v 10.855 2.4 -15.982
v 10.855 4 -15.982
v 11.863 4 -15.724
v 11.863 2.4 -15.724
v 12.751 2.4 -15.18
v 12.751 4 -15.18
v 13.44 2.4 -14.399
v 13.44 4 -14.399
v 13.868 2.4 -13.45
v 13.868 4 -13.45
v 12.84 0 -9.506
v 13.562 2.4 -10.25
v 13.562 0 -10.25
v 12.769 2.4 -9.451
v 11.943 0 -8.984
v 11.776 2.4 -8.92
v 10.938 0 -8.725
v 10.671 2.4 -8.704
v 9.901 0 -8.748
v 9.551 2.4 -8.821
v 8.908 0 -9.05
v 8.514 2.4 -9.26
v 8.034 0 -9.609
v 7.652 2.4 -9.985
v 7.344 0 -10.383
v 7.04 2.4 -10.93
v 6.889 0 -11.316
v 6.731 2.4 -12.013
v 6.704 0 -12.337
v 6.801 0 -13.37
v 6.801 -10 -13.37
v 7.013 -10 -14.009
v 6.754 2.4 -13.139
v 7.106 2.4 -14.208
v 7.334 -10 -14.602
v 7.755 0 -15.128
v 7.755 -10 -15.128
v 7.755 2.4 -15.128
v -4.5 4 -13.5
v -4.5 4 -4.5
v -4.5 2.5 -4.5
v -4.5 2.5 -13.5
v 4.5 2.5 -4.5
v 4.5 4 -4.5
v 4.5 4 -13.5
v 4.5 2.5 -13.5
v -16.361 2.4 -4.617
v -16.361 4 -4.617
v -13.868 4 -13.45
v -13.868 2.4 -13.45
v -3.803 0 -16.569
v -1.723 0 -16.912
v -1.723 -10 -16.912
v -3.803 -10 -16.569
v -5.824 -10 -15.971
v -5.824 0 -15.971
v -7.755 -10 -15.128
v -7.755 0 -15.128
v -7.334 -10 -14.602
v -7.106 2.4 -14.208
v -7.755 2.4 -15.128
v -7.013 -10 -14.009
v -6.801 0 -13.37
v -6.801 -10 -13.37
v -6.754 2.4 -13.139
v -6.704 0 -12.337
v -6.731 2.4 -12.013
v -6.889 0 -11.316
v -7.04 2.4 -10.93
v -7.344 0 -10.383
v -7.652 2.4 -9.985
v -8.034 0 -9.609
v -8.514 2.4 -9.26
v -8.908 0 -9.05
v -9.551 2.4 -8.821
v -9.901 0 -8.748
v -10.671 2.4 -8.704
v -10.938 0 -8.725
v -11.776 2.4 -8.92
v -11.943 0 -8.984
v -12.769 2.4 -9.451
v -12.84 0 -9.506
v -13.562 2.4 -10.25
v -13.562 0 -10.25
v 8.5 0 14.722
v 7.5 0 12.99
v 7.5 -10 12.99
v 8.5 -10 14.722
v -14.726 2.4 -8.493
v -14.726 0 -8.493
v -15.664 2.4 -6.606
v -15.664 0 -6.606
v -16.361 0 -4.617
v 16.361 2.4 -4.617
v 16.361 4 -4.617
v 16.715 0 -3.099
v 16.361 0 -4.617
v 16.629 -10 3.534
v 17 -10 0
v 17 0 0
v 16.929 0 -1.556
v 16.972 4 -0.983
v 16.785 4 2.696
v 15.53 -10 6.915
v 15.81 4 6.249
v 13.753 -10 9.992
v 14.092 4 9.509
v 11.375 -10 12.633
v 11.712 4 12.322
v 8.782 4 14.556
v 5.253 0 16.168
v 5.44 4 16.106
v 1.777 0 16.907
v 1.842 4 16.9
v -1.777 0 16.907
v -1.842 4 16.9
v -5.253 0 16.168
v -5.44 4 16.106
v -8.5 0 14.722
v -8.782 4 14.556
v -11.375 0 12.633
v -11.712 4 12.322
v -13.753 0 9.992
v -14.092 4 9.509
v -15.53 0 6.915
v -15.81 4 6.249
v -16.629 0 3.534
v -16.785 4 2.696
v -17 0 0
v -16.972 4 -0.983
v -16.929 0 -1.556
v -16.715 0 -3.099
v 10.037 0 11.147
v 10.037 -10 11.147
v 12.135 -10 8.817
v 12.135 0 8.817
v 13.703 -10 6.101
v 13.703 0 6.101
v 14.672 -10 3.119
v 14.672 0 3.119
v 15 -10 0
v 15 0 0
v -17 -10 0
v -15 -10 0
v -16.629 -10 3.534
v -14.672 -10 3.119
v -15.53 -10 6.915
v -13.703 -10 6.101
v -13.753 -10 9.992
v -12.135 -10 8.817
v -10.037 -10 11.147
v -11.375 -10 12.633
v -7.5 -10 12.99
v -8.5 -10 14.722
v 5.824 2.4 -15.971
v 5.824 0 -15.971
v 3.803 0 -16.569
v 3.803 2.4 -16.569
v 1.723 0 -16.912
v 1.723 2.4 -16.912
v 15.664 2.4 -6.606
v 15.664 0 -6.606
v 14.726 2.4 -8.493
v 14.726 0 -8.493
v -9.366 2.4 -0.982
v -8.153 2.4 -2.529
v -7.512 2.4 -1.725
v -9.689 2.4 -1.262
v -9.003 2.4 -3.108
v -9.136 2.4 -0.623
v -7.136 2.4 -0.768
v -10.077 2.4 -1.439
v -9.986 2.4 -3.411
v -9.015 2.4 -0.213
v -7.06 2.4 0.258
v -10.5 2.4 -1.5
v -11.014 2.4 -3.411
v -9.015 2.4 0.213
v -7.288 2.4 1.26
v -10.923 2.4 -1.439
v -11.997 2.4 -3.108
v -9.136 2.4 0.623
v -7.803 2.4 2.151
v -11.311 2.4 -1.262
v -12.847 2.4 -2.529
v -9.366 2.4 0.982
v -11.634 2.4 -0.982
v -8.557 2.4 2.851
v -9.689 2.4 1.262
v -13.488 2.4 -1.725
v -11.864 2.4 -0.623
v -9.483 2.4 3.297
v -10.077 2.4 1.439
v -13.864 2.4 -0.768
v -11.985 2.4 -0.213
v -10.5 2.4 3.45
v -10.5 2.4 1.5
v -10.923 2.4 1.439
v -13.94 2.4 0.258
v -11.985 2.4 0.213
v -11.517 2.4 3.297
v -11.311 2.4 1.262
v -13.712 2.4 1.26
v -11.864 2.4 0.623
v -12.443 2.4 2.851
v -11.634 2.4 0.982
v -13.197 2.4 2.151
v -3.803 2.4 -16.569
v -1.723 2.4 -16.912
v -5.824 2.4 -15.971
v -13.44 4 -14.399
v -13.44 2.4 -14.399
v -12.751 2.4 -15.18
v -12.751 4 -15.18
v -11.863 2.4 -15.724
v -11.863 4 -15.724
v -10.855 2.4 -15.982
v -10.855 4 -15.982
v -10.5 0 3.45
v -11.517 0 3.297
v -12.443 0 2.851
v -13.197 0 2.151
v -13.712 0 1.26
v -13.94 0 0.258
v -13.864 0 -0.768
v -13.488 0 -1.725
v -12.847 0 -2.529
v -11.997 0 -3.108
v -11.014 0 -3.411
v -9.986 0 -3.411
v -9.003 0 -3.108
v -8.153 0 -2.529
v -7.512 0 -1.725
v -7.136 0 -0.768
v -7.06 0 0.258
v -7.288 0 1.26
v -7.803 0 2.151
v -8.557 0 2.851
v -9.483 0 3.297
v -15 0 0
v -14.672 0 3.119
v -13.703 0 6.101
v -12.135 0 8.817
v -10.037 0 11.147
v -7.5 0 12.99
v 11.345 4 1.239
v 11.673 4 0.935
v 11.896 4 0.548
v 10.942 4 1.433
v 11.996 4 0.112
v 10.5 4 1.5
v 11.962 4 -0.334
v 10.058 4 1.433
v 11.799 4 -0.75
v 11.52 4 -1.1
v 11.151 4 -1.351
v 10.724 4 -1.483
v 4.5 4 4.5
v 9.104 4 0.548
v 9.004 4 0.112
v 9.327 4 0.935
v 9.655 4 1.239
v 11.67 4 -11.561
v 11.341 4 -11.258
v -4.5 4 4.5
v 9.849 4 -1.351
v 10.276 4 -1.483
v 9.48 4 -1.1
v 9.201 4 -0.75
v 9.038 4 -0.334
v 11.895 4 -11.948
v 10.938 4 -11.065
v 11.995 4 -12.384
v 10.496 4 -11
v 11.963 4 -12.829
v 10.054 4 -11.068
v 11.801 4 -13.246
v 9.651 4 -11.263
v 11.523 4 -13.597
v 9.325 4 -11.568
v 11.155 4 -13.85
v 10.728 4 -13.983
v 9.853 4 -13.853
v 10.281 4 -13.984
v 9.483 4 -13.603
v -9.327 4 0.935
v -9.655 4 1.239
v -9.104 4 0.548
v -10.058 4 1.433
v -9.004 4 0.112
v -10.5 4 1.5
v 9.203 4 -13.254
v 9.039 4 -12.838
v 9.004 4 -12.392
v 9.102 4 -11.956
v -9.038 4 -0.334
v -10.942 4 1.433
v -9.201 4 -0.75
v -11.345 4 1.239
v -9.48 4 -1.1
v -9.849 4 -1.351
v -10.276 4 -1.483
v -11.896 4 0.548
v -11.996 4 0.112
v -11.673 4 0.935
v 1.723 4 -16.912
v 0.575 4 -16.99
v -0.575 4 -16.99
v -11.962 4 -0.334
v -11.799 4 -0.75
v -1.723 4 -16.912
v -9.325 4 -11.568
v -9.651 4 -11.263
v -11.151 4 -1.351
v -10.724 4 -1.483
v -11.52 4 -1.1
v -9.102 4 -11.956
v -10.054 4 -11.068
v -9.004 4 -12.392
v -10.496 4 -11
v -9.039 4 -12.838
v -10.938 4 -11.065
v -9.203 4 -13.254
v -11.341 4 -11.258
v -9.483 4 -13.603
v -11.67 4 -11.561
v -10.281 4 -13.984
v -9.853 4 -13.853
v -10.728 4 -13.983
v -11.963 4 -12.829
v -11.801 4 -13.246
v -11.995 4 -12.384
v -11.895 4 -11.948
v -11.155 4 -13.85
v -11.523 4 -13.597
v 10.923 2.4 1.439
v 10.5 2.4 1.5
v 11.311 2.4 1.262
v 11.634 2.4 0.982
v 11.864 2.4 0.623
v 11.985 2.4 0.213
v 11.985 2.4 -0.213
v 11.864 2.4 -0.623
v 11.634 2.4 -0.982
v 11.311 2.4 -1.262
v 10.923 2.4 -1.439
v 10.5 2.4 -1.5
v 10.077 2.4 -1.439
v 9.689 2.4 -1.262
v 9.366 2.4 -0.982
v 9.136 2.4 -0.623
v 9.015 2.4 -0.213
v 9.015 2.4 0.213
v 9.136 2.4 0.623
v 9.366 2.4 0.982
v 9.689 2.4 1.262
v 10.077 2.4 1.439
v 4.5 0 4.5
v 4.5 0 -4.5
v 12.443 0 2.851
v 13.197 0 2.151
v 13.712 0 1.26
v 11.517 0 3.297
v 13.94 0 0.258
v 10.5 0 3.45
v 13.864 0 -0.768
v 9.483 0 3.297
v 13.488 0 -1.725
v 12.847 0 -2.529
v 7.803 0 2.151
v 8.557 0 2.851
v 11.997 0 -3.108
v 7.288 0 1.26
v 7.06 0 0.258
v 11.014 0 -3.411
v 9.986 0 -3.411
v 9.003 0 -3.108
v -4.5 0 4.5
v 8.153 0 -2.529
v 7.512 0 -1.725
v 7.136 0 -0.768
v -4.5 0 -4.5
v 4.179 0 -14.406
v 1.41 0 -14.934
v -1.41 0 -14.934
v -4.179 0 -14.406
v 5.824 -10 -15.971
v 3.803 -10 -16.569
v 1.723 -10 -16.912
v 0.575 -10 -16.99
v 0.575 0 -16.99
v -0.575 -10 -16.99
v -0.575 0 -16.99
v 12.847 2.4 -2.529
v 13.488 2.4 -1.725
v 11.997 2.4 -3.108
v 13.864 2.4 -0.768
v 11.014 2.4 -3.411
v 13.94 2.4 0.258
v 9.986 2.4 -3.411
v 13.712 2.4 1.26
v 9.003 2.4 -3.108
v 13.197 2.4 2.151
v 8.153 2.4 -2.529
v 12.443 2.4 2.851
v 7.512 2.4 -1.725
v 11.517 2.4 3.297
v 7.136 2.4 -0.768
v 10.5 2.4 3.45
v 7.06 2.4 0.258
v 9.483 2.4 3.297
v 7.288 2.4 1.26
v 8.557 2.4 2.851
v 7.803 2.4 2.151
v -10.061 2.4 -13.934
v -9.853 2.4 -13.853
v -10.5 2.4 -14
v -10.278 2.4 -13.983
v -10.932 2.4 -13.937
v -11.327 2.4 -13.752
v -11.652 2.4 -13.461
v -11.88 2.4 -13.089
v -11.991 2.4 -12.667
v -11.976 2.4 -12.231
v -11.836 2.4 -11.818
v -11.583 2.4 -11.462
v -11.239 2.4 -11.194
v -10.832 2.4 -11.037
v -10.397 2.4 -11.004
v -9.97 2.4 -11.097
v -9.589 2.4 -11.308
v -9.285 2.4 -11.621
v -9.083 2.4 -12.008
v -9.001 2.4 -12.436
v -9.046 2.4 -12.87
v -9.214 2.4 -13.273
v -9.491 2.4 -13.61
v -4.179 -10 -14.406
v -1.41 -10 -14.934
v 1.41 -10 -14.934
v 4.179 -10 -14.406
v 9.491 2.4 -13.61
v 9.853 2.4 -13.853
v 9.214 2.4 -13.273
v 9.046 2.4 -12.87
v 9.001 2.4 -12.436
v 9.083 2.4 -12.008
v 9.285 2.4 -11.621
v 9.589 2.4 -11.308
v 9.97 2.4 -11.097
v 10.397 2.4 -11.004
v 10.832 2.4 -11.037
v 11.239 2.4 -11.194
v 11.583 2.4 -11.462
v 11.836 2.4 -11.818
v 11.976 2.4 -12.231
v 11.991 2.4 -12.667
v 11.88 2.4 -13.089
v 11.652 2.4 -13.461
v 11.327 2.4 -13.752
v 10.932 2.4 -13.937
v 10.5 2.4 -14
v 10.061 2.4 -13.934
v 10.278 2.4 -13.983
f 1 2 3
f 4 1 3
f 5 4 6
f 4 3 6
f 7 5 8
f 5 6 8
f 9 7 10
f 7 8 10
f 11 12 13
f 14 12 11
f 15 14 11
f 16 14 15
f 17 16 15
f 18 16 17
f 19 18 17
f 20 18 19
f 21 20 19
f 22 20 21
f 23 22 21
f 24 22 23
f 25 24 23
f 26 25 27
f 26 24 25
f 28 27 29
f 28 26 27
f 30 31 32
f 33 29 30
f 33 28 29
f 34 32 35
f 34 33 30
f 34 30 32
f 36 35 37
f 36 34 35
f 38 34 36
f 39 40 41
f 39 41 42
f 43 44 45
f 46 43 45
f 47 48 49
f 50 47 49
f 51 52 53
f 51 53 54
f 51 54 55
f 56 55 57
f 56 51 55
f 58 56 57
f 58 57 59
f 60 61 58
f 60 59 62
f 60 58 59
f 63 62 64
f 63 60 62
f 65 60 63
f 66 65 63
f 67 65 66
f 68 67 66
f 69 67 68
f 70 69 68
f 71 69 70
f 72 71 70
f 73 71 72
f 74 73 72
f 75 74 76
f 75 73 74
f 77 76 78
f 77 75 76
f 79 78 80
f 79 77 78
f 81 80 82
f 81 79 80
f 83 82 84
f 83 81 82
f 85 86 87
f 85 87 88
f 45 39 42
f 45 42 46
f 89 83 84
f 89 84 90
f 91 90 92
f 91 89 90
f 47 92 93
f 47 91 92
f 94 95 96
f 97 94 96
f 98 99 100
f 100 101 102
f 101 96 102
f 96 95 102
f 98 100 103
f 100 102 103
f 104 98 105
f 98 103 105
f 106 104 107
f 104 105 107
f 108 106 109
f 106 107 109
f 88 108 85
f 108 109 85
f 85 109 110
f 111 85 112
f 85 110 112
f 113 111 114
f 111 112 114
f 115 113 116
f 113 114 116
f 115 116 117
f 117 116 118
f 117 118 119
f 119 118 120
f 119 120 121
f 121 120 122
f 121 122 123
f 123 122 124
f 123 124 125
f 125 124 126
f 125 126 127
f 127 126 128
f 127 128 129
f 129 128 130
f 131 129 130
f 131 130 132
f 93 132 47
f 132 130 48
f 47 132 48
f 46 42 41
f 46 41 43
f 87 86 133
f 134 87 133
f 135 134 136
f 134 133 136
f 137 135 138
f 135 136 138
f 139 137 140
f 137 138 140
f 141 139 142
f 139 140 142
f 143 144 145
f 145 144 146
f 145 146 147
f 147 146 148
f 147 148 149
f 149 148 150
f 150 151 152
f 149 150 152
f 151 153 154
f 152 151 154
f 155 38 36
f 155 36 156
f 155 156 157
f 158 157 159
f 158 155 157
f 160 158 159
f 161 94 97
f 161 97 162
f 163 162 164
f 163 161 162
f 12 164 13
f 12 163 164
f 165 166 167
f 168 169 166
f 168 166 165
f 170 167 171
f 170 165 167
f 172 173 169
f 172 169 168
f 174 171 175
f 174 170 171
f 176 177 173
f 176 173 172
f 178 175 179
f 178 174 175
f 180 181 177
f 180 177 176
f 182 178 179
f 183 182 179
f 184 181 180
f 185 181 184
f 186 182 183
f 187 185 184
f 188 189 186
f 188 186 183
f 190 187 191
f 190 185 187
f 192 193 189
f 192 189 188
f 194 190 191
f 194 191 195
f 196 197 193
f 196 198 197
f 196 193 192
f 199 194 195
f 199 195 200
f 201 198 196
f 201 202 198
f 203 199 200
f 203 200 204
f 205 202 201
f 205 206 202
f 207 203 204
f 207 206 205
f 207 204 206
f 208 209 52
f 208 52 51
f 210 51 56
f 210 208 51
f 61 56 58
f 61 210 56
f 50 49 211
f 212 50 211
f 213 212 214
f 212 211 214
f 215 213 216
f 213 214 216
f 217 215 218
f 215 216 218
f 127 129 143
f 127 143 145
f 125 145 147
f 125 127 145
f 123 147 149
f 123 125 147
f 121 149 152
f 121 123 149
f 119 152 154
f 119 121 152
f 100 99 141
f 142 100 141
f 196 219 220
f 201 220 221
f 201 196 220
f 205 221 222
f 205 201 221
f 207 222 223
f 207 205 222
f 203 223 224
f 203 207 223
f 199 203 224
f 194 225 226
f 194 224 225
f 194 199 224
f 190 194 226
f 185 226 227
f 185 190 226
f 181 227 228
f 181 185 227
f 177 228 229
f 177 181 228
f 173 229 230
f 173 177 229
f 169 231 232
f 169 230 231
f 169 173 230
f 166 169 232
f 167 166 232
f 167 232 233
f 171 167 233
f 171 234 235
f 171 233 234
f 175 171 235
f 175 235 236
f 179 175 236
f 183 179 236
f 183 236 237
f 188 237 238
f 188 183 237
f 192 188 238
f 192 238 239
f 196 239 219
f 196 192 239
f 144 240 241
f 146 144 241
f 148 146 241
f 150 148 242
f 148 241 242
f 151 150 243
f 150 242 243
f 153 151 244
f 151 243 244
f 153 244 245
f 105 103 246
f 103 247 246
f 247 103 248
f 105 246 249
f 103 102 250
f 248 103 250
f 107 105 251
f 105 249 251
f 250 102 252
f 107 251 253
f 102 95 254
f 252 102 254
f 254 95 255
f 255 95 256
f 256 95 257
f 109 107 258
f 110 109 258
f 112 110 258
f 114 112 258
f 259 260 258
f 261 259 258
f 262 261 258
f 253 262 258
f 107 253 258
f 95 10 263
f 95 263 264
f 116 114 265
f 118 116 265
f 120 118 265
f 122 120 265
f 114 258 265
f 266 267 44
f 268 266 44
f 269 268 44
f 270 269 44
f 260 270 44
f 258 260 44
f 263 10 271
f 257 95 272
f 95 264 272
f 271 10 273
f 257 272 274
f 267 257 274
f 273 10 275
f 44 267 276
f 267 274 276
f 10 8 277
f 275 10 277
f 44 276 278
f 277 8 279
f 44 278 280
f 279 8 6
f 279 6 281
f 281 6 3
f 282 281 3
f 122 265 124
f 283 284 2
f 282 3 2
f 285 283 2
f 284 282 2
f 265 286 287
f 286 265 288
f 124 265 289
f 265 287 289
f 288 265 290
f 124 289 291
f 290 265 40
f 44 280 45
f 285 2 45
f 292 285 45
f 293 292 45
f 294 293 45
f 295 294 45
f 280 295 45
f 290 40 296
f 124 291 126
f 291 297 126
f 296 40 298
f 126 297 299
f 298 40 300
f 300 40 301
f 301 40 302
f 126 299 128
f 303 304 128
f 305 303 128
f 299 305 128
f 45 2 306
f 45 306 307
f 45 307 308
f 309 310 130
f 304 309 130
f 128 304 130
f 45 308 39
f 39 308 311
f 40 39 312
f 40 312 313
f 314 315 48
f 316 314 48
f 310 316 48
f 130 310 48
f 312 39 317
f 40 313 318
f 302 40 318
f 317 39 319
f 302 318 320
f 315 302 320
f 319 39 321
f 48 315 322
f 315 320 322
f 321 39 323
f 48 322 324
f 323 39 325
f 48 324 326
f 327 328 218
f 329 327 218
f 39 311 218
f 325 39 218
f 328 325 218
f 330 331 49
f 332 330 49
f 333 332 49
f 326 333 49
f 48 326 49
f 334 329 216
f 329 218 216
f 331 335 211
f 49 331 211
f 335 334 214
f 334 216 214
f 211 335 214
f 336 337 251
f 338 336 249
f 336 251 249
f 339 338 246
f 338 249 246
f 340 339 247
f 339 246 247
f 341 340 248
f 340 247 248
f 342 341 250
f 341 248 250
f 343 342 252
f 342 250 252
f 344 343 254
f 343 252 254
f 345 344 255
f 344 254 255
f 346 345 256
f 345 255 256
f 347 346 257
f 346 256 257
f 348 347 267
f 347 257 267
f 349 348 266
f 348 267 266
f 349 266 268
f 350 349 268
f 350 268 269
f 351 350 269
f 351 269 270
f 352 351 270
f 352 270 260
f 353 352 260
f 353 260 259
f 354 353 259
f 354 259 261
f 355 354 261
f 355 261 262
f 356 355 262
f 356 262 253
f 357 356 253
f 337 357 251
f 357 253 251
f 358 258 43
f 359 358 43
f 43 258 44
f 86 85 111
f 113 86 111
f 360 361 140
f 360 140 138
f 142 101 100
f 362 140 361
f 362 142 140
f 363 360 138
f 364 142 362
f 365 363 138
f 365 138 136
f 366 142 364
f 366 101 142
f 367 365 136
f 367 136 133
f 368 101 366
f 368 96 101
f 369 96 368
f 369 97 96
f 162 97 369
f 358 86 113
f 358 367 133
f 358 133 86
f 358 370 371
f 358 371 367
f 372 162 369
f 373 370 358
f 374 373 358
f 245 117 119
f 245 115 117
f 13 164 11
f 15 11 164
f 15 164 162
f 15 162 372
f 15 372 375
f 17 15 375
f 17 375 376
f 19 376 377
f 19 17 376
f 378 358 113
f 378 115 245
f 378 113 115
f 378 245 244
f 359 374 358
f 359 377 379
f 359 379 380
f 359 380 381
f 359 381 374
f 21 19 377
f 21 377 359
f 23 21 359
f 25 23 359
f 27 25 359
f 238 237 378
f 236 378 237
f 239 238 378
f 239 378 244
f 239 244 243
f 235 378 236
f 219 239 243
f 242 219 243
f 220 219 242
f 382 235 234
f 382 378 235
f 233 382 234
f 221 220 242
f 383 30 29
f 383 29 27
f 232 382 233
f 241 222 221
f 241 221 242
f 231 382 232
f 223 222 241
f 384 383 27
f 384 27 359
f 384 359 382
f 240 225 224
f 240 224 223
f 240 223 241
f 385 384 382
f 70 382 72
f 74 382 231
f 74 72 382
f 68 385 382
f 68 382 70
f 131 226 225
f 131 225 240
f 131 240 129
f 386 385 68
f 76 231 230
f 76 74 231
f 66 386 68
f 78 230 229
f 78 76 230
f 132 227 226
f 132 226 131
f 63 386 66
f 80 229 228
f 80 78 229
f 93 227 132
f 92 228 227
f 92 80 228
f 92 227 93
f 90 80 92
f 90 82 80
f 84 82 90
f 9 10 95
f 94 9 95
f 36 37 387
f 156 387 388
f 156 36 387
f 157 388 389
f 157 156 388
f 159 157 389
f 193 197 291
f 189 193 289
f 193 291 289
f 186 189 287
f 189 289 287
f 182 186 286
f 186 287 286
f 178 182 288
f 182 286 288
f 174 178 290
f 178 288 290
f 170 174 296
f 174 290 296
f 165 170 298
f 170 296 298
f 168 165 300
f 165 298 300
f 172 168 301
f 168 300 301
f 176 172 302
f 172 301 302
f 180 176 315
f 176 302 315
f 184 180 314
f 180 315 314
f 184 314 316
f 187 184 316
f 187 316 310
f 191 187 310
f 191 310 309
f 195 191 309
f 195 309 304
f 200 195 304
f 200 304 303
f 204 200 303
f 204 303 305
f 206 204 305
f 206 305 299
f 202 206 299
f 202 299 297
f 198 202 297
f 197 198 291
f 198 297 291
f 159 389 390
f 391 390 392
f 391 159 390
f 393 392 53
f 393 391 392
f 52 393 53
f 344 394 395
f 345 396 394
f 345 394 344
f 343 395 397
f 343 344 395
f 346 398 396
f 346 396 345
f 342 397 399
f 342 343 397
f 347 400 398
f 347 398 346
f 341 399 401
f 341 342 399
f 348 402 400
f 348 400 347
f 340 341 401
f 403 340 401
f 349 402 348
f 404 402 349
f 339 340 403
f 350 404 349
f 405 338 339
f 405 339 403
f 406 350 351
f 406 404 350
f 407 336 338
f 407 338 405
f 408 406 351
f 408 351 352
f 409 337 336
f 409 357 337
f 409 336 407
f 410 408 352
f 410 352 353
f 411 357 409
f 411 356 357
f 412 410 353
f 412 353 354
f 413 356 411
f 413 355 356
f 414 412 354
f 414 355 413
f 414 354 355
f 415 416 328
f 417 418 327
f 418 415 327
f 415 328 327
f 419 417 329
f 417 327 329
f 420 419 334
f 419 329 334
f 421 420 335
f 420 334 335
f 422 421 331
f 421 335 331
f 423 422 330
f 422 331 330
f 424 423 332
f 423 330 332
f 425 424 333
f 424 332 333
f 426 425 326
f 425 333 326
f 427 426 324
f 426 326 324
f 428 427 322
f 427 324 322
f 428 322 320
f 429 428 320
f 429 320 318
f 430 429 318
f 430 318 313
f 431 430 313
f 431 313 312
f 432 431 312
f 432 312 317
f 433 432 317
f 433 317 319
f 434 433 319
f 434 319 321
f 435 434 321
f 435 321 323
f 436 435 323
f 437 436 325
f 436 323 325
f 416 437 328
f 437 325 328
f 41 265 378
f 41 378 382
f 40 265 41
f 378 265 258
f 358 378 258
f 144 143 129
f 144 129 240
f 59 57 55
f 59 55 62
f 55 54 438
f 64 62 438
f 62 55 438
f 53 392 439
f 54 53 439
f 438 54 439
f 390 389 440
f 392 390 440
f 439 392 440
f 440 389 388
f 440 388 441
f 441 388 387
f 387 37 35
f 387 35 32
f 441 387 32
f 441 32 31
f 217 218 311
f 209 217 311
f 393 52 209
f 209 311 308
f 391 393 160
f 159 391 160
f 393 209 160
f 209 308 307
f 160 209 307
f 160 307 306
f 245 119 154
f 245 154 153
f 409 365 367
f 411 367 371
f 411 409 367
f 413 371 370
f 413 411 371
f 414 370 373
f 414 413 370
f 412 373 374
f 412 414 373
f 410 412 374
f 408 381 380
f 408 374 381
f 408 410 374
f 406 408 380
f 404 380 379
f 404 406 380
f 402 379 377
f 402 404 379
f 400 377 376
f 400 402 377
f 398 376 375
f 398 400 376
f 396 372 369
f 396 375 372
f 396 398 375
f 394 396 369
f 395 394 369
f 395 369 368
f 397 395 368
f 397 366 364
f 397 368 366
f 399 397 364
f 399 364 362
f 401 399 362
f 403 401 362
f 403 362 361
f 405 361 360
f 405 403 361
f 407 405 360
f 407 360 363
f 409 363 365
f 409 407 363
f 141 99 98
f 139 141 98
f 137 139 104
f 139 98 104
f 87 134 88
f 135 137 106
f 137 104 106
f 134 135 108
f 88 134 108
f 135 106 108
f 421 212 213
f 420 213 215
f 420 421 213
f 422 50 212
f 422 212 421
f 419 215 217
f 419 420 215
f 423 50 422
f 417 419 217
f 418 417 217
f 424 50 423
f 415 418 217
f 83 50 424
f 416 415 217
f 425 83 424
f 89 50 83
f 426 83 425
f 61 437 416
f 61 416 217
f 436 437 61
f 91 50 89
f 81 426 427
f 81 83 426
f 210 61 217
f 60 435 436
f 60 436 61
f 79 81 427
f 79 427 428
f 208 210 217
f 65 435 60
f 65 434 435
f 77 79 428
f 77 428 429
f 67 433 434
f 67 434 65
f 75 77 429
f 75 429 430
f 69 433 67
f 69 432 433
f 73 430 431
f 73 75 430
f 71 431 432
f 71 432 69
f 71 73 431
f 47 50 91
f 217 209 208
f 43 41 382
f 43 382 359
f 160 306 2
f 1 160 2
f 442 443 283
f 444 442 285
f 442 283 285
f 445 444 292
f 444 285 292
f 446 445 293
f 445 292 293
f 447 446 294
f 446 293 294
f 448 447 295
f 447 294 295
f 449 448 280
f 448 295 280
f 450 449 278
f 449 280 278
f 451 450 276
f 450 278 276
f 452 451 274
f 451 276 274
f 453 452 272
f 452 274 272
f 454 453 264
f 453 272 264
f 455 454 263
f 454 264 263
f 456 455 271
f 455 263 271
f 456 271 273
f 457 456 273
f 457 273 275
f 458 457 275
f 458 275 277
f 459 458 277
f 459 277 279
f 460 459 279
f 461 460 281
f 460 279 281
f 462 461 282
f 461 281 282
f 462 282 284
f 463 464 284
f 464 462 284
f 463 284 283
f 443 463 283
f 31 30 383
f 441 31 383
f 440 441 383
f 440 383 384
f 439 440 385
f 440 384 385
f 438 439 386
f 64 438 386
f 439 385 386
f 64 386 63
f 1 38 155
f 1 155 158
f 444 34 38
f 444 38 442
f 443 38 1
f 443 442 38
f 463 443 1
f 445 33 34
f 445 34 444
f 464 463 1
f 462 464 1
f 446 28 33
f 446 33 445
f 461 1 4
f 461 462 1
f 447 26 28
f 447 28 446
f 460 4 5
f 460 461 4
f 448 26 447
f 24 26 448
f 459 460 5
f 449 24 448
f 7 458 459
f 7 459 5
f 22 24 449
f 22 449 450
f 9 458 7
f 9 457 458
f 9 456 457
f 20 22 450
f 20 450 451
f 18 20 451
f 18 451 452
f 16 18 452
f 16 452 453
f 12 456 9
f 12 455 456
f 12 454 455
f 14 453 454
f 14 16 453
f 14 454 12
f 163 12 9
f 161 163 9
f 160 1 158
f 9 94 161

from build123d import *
from build123d.topology import SkipClean

# Parameters (mm, degrees)
SKETCH1_R               = 17
SKETCH1_R_2             = 15
BOSS_EXTRUDE1_DEPTH     = 10
BOSS_EXTRUDE2_START     = 4
SKETCH5_R               = 1.5
SKETCH5_W               = 9
SKETCH5_H               = 9
BOSS_EXTRUDE2_DEPTH     = 4
CUT_EXTRUDE2_REACH      = 28.038
CUT_EXTRUDE3_DEPTH      = 27.038433133
CUT_EXTRUDE3_DEPTH_BACK = 2.4
SKETCH10_R              = 1.5
SKETCH10_R_2            = 3.45
SKETCH11_W              = 9
SKETCH11_H              = 9
CUT_EXTRUDE4_DEPTH      = 1.5


with BuildPart() as part:
    # Sketch1 → Boss-Extrude1 (new body)
    with BuildSketch(Plane(origin=(0, 0, 0), x_dir=(1, 0, 0), z_dir=(0, 1, 0))):
        with Locations(Location((0, 0, 0), (0, 0, 270))):
            Circle(SKETCH1_R)
        with Locations(Location((0, 0, 0), (0, 0, 270))):
            Circle(SKETCH1_R_2, mode=Mode.SUBTRACT)
    extrude(amount=-BOSS_EXTRUDE1_DEPTH)

    # Sketch5 → Boss-Extrude2 (add)
    with SkipClean():  # the faces are left unmerged after this step: merging them gives an invalid solid
        with BuildSketch(Plane(origin=(0, 0, 0), x_dir=(1, 0, 0), z_dir=(0, 1, 0)).offset(BOSS_EXTRUDE2_START)):
            with BuildLine():
                Line((-10.854796925, 15.981970583), (-1.723299349, 16.912428547))
                ThreePointArc((-1.723299349, 16.912428547), (0, 17), (1.723299349, 16.912428547))
                Line((1.723299349, 16.912428547), (10.854796925, 15.981970583))
                ThreePointArc((10.854796925, 15.981970583), (12.751172302, 15.179967027), (13.868467616, 13.450487203))
                Line((13.868467616, 13.450487203), (16.361128418, 4.616652129))
                ThreePointArc((16.361128418, 4.616652129), (0, -17), (-16.361128418, 4.616652129))
                Line((-16.361128418, 4.616652129), (-13.868467616, 13.450487203))
                ThreePointArc((-13.868467616, 13.450487203), (-12.751172302, 15.179967027), (-10.854796925, 15.981970583))
            make_face()
            with Locations(Location((-10.5, 0, 0), (0, 0, 270))):
                Circle(SKETCH5_R, mode=Mode.SUBTRACT)
            with Locations(Location((10.5, 0, 0), (0, 0, 270))):
                Circle(SKETCH5_R, mode=Mode.SUBTRACT)
            with Locations(Location((-10.5, 12.5, 0), (0, 0, 64.453929983))):
                Circle(SKETCH5_R, mode=Mode.SUBTRACT)
            with Locations(Location((10.5, 12.5, 0), (0, 0, 115.546070017))):
                Circle(SKETCH5_R, mode=Mode.SUBTRACT)
            Rectangle(SKETCH5_W, SKETCH5_H, mode=Mode.SUBTRACT)
        extrude(amount=-BOSS_EXTRUDE2_DEPTH)

    # Sketch9 → Cut-Extrude2 (cut, up to next)
    with BuildSketch(Plane.XZ, mode=Mode.PRIVATE) as cut_extrude2_sk1:
        with BuildLine():
            Line((7.5, 12.990381057), (8.5, 14.722431864))
            ThreePointArc((8.5, 14.722431864), (0, 17), (-8.5, 14.722431864))
            Line((-8.5, 14.722431864), (-7.5, 12.990381057))
            ThreePointArc((-7.5, 12.990381057), (0, 15), (7.5, 12.990381057))
        make_face()
    cut_extrude2_tool1 = extrude(cut_extrude2_sk1.sketch, amount=CUT_EXTRUDE2_REACH, mode=Mode.PRIVATE) & part.part
    # Sketch9 → Cut-Extrude2 (cut, up to next)
    with BuildSketch(Plane.XZ, mode=Mode.PRIVATE) as cut_extrude2_sk2:
        with BuildLine():
            Line((7.5, -12.990381057), (8.5, -14.722431864))
            ThreePointArc((8.5, -14.722431864), (14.722431864, -8.5), (17, 0))
            Line((17, 0), (15, 0))
            ThreePointArc((15, 0), (12.990381057, -7.5), (7.5, -12.990381057))
        make_face()
    cut_extrude2_tool2 = extrude(cut_extrude2_sk2.sketch, amount=CUT_EXTRUDE2_REACH, mode=Mode.PRIVATE) & part.part
    # Sketch9 → Cut-Extrude2 (cut, up to next)
    with BuildSketch(Plane.XZ, mode=Mode.PRIVATE) as cut_extrude2_sk3:
        with BuildLine():
            Line((-7.5, -12.990381057), (-8.5, -14.722431864))
            ThreePointArc((-8.5, -14.722431864), (-14.722431864, -8.5), (-17, 0))
            Line((-17, 0), (-15, 0))
            ThreePointArc((-15, 0), (-12.990381057, -7.5), (-7.5, -12.990381057))
        make_face()
    cut_extrude2_tool3 = extrude(cut_extrude2_sk3.sketch, amount=CUT_EXTRUDE2_REACH, mode=Mode.PRIVATE) & part.part
    add(cut_extrude2_tool1.solids().sort_by_distance((0, 0, 15.298769))[0], mode=Mode.SUBTRACT)
    add(cut_extrude2_tool2.solids().sort_by_distance((13.249123, 0, -7.649384))[0], mode=Mode.SUBTRACT)
    add(cut_extrude2_tool3.solids().sort_by_distance((-13.249123, 0, -7.649384))[0], mode=Mode.SUBTRACT)

    # Sketch10 → Cut-Extrude3 (cut, two sides: drawn at the far end of the back side and taken through both)
    # profile 1 of 4: a face of its own
    with SkipClean():  # the faces are left unmerged after this step: merging them gives an invalid solid
        with BuildSketch(Plane.XZ.offset(-CUT_EXTRUDE3_DEPTH_BACK)):
            with BuildLine():
                Line((-16.361128418, -4.616652129), (-13.868467616, -13.450487203))
                ThreePointArc((-13.868467616, -13.450487203), (-12.751172302, -15.179967027), (-10.854796925, -15.981970583))
                Line((-10.854796925, -15.981970583), (-1.723299349, -16.912428547))
                ThreePointArc((-1.723299349, -16.912428547), (-4.822527429, -16.301632716), (-7.755248385, -15.127991357))
                ThreePointArc((-7.755248385, -15.127991357), (-8.055870072, -9.590321514), (-13.562312591, -10.250057424))
                ThreePointArc((-13.562312591, -10.250057424), (-15.224549066, -7.563934541), (-16.361128418, -4.616652129))
            make_face()
            with Locations(Location((-10.5, -12.5, 0), (0, 0, 270))):
                Circle(SKETCH10_R, mode=Mode.SUBTRACT)
        # profile 2 of 4: a face of its own
        with BuildSketch(Plane.XZ.offset(-CUT_EXTRUDE3_DEPTH_BACK)):
            with BuildLine():
                ThreePointArc((7.755248385, -15.127991357), (4.822527429, -16.301632716), (1.723299349, -16.912428547))
                Line((1.723299349, -16.912428547), (10.854796925, -15.981970583))
                ThreePointArc((10.854796925, -15.981970583), (12.751172302, -15.179967027), (13.868467616, -13.450487203))
                Line((13.868467616, -13.450487203), (16.361128418, -4.616652129))
                ThreePointArc((16.361128418, -4.616652129), (15.224549066, -7.563934541), (13.562312591, -10.250057424))
                ThreePointArc((13.562312591, -10.250057424), (8.055870072, -9.590321514), (7.755248385, -15.127991357))
            make_face()
            with Locations(Location((10.5, -12.5, 0), (0, 0, 270))):
                Circle(SKETCH10_R, mode=Mode.SUBTRACT)
        # profile 3 of 4: a face of its own
        with BuildSketch(Plane.XZ.offset(-CUT_EXTRUDE3_DEPTH_BACK)):
            with Locations(Location((-10.5, 0, 0), (0, 0, 90))):
                Circle(SKETCH10_R_2)
            with Locations(Location((-10.5, 0, 0), (0, 0, 270))):
                Circle(SKETCH10_R, mode=Mode.SUBTRACT)
        # profile 4 of 4: a face of its own
        with BuildSketch(Plane.XZ.offset(-CUT_EXTRUDE3_DEPTH_BACK)):
            with Locations(Location((10.5, 0, 0), (0, 0, 90))):
                Circle(SKETCH10_R_2)
            with Locations(Location((10.5, 0, 0), (0, 0, 270))):
                Circle(SKETCH10_R, mode=Mode.SUBTRACT)
        extrude(amount=CUT_EXTRUDE3_DEPTH + CUT_EXTRUDE3_DEPTH_BACK, mode=Mode.SUBTRACT)

    # Sketch11 → Cut-Extrude4 (cut)
    with SkipClean():  # the faces are left unmerged after this step: merging them gives an invalid solid
        with BuildSketch(Plane(origin=(0, 4, 0), x_dir=(1, 0, 0), z_dir=(0, 1, 0))):
            with Locations((0, 9)):
                Rectangle(SKETCH11_W, SKETCH11_H)
        extrude(amount=-CUT_EXTRUDE4_DEPTH, mode=Mode.SUBTRACT)


solid = part.part
